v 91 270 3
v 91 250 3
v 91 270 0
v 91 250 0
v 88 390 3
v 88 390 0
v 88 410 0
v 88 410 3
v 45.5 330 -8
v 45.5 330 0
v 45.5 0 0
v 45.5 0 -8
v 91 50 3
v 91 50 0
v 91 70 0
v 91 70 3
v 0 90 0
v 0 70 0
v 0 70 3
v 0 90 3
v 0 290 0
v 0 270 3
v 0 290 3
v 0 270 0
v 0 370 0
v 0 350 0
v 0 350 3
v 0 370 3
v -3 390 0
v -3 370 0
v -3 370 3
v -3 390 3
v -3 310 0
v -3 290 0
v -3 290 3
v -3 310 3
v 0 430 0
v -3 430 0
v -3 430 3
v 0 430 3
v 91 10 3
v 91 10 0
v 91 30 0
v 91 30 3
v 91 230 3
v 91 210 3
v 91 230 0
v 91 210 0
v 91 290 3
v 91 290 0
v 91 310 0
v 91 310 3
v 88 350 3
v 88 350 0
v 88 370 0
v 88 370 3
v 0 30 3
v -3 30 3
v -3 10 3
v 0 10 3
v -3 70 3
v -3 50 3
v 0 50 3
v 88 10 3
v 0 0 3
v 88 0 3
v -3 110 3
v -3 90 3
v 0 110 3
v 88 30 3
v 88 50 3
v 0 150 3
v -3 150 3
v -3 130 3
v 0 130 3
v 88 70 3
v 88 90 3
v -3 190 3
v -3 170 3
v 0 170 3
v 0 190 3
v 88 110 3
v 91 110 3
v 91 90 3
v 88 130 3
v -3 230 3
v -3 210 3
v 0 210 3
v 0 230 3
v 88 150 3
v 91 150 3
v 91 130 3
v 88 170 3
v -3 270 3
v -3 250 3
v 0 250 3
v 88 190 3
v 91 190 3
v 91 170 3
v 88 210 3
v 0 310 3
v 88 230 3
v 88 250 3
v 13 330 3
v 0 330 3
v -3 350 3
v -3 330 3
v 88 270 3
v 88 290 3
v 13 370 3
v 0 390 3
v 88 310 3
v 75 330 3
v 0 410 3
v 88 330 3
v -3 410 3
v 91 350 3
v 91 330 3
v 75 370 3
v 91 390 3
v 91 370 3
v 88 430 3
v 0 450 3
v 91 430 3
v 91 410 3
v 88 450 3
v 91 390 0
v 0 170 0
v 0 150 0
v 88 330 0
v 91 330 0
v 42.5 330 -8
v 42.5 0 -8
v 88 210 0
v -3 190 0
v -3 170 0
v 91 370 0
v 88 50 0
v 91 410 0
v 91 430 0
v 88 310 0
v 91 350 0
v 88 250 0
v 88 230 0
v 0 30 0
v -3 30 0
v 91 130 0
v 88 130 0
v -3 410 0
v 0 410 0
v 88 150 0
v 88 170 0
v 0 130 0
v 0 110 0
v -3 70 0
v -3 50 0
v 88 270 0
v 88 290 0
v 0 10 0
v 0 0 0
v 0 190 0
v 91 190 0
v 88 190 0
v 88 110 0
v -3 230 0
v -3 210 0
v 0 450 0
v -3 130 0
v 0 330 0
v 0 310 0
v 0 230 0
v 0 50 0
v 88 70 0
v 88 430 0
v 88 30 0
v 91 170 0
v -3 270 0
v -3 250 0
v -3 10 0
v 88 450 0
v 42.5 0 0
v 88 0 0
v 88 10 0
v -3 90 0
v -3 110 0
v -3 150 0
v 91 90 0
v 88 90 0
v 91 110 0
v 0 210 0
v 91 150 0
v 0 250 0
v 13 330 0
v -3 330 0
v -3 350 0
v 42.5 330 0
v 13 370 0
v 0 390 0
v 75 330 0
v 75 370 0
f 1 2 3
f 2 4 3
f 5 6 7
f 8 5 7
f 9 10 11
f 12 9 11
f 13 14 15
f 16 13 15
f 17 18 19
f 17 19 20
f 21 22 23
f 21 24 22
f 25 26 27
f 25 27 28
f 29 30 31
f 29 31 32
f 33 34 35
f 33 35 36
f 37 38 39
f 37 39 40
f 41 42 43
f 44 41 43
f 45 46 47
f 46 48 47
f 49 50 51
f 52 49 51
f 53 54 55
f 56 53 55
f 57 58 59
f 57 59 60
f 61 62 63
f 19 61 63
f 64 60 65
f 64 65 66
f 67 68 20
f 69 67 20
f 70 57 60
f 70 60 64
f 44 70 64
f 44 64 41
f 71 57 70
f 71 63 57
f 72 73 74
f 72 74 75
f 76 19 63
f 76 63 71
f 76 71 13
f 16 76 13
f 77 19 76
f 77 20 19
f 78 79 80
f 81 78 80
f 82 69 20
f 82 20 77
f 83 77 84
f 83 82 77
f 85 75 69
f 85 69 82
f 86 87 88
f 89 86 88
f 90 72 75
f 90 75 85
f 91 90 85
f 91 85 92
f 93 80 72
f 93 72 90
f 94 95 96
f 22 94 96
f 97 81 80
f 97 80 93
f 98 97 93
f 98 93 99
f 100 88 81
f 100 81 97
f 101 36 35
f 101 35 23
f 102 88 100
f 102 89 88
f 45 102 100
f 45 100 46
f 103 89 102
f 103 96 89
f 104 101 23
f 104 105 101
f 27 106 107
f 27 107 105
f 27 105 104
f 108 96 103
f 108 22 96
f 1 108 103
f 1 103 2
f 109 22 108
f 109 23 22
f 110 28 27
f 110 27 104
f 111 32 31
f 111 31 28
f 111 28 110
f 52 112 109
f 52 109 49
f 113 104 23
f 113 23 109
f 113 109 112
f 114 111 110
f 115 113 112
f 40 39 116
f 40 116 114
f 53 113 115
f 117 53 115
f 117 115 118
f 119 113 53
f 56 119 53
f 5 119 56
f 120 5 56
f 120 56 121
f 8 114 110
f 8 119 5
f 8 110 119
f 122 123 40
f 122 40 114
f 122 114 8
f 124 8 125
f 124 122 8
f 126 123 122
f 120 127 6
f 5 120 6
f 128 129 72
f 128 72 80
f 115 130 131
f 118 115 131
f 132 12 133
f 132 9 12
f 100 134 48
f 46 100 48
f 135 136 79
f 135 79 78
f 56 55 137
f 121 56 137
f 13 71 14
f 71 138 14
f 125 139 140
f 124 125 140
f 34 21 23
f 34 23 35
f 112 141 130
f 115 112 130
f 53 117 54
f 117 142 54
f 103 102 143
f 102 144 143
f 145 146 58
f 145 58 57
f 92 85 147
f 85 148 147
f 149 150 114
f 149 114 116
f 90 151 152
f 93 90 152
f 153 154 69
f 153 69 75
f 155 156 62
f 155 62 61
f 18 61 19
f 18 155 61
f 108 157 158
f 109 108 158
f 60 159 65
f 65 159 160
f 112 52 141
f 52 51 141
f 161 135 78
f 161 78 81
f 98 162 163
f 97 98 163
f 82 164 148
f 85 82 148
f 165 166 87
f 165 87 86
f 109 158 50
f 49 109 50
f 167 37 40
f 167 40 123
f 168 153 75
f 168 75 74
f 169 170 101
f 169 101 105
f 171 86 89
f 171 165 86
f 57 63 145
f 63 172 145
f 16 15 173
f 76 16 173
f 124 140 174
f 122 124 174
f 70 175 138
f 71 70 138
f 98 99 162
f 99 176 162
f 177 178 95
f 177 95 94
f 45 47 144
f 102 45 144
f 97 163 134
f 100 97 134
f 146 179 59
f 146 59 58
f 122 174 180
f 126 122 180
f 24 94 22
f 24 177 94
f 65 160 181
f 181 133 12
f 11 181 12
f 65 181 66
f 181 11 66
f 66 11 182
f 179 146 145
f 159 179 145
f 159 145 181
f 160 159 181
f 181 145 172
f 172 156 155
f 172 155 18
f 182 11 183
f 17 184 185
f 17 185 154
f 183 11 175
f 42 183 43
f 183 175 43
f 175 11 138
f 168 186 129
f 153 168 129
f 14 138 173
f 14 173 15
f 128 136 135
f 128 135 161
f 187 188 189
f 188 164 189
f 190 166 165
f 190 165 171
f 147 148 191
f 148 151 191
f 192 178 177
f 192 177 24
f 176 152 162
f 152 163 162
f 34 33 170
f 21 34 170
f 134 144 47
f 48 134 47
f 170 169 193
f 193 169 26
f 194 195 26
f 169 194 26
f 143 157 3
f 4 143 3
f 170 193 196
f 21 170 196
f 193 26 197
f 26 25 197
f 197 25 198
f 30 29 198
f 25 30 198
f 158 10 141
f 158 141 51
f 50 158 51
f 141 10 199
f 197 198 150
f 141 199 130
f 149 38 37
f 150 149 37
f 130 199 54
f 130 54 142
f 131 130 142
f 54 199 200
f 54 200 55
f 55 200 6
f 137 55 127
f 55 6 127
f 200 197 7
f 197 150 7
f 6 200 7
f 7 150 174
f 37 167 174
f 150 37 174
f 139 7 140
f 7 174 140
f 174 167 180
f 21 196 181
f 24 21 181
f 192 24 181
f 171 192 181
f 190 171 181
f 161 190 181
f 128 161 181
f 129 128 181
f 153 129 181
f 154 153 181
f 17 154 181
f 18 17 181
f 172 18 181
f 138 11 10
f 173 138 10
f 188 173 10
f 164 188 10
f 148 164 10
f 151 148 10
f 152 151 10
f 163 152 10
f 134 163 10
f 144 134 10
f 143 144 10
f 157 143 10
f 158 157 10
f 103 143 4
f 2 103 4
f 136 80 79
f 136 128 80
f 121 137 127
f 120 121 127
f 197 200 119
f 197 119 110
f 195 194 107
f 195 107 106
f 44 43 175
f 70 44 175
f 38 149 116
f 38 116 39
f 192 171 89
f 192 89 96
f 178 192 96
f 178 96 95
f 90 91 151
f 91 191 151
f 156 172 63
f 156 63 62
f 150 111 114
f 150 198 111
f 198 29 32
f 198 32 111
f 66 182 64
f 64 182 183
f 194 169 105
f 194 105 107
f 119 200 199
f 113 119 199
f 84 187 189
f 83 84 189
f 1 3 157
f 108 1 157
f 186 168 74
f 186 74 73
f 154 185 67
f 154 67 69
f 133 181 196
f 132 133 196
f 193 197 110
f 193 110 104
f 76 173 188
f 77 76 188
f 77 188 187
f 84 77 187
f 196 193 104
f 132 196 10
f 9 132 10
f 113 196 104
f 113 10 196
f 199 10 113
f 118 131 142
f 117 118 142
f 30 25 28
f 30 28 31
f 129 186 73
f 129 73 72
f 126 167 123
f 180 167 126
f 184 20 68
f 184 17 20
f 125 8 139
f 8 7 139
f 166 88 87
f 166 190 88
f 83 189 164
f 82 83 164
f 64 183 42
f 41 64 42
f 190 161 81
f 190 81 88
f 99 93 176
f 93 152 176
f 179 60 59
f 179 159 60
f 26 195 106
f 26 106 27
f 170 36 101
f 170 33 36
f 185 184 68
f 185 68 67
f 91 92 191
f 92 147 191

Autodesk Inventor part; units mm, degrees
ref_plane "YZ Plane" through (0, 0, 0) normal (1, 0, 0) x (0, 1, 0)
ref_plane "XZ Plane" through (0, 0, 0) normal (0, 1, 0) x (-1, 0, 0)
ref_plane "XY Plane" through (0, 0, 0) normal (0, 0, 1) x (1, 0, 0)
sketch "Sketch1" plane through (0, 0, 0) normal (0, 0, 1) x (1, 0, 0)
  line L0 (0, 0) -> (88, 0)
  line L1 (88, 0) -> (88, 10)
  line L2 (88, 10) -> (91, 10)
  line L3 (91, 10) -> (91, 30)
  line L4 (91, 30) -> (88, 30)
  line L5 (88, 30) -> (88, 50)
  line L6 (88, 50) -> (91, 50)
  line L7 (91, 50) -> (91, 70)
  line L8 (91, 70) -> (88, 70)
  line L9 (88, 70) -> (88, 90)
  line L10 (88, 90) -> (91, 90)
  line L11 (91, 90) -> (91, 110)
  line L12 (91, 110) -> (88, 110)
  line L13 (88, 110) -> (88, 130)
  line L14 (88, 130) -> (91, 130)
  line L15 (91, 130) -> (91, 150)
  line L16 (91, 150) -> (88, 150)
  line L17 (88, 150) -> (88, 170)
  line L18 (88, 170) -> (91, 170)
  line L19 (91, 170) -> (91, 190)
  line L20 (91, 190) -> (88, 190)
  line L21 (88, 190) -> (88, 210)
  line L22 (88, 210) -> (91, 210)
  line L23 (91, 210) -> (91, 230)
  line L24 (91, 230) -> (88, 230)
  line L25 (88, 230) -> (88, 250)
  line L26 (88, 250) -> (91, 250)
  line L27 (91, 250) -> (91, 270)
  line L28 (91, 270) -> (88, 270)
  line L29 (88, 270) -> (88, 290)
  line L30 (88, 290) -> (91, 290)
  line L31 (91, 290) -> (91, 310)
  line L32 (91, 310) -> (88, 310)
  line L33 (88, 310) -> (88, 330)
  line L34 (88, 330) -> (91, 330)
  line L35 (91, 330) -> (91, 350)
  line L36 (91, 350) -> (88, 350)
  line L37 (88, 350) -> (88, 370)
  line L38 (88, 370) -> (91, 370)
  line L39 (91, 370) -> (91, 390)
  line L40 (91, 390) -> (88, 390)
  line L41 (88, 390) -> (88, 410)
  line L42 (88, 410) -> (91, 410)
  line L43 (91, 410) -> (91, 430)
  line L44 (91, 430) -> (88, 430)
  line L45 (44, 0) -> (44, 110) construction
  line L46 (-3, 10) -> (-3, 30)
  line L47 (-3, 30) -> (0, 30)
  line L48 (0, 10) -> (-3, 10)
  line L49 (0, 50) -> (-3, 50)
  line L50 (-3, 50) -> (-3, 70)
  line L51 (0, 70) -> (0, 90)
  line L52 (0, 90) -> (-3, 90)
  line L53 (-3, 90) -> (-3, 110)
  line L54 (-3, 70) -> (0, 70)
  line L55 (-3, 110) -> (0, 110)
  line L56 (0, 110) -> (0, 130)
  line L57 (0, 130) -> (-3, 130)
  line L58 (-3, 130) -> (-3, 150)
  line L59 (-3, 170) -> (-3, 190)
  line L60 (0, 150) -> (0, 170)
  line L61 (0, 170) -> (-3, 170)
  line L62 (-3, 150) -> (0, 150)
  line L63 (0, 190) -> (0, 210)
  line L64 (-3, 190) -> (0, 190)
  line L65 (0, 210) -> (-3, 210)
  line L66 (-3, 210) -> (-3, 230)
  line L67 (-3, 230) -> (0, 230)
  line L68 (0, 230) -> (0, 250)
  line L69 (0, 250) -> (-3, 250)
  line L70 (-3, 250) -> (-3, 270)
  line L71 (-3, 270) -> (0, 270)
  line L72 (0, 270) -> (0, 290)
  line L73 (0, 290) -> (-3, 290)
  line L74 (-3, 290) -> (-3, 310)
  line L75 (-3, 310) -> (0, 310)
  line L76 (0, 310) -> (0, 330)
  line L77 (0, 350) -> (0, 370)
  line L78 (-3, 350) -> (0, 350)
  line L79 (-3, 330) -> (-3, 350)
  line L80 (0, 330) -> (-3, 330)
  line L81 (0, 370) -> (-3, 370)
  line L82 (-3, 370) -> (-3, 390)
  line L83 (-3, 390) -> (0, 390)
  line L84 (0, 390) -> (0, 410)
  line L85 (0, 410) -> (-3, 410)
  line L86 (-3, 410) -> (-3, 430)
  line L87 (-3, 430) -> (0, 430)
  line L88 (0, 430) -> (0, 450)
  line L89 (0, 450) -> (88, 450)
  line L90 (88, 430) -> (88, 450)
  line L91 (0, 50) -> (0, 30)
  line L92 (0, 10) -> (0, 0)
  point P0 (0, 0)
  dimension "d1" = 10
  dimension "d2" = 3
  dimension "d3" = 20
  dimension "d4" = 3
  dimension "d5" = 20
  dimension "d6" = 20
  dimension "d7" = 20
  dimension "d8" = 20
  dimension "d9" = 20
  dimension "d10" = 3
  dimension "d11" = 20
  dimension "d12" = 20
  dimension "d13" = 20
  dimension "d14" = 3
  dimension "d15" = 20
  dimension "d16" = 3
  dimension "d17" = 20
  dimension "d18" = 20
  dimension "d19" = 20
  dimension "d20" = 3
  dimension "d21" = 20
  dimension "d22" = 20
  dimension "d23" = 20
  dimension "d24" = 20
  dimension "d25" = 20
  dimension "d26" = 20
  dimension "d27" = 20
  dimension "d28" = 20
  dimension "d30" = 0
  dimension "d31" = 0
  dimension "d34" = 110
  dimension "d35" = 0
  dimension "d36" = 0
  dimension "d37" = 0
  dimension "d38" = 0
  dimension "d39" = 3
  dimension "d43" = 88
  dimension "d65" = 20
extrude "Extrusion1" add sketch "Sketch1" along normal blind 3
sketch "Sketch4" plane through (0, 0, 0) normal (0, 0, -1) x (-1, 0, 0)
  line L0 (-98.5, 430) -> (-44, 430)
  line L1 (-91, 430) -> (3, 430) projected
  line L2 (-44.5, 330) -> (-75, 330)
  line L3 (-75, 350) -> (-75, 0) projected
  line L4 (-75, 330) -> (-75, 370)
  line L5 (-75, 370) -> (-43, 370)
  line L6 (-43, 370) -> (-13, 370)
  line L7 (-13, 370) -> (-13, 330)
  line L8 (-13, 330) -> (-44.5, 330)
  line L9 (0, 370) -> (0, 350) projected
  point P0 (0, 0)
  dimension "d55" = 30
  dimension "d58" = 60
  dimension "d59" = 40
  dimension "d61" = 30.5
  dimension "d62" = 0
  dimension "d63" = 80
  dimension "d64" = 23.5
  dimension "d66" = 13
extrude "Extrusion4" cut sketch "Sketch4" against normal blind 19
sketch "Sketch5" plane through (0, 0, 3) normal (0, 0, 1) x (1, 0, 0)
  point P0 (0, 0)
sketch "Sketch6" plane through (0, 0, 0) normal (0, 0, -1) x (-1, 0, 0)
  line L0 (0, 0) -> (-88, 0) projected
  line L1 (-44, 0) -> (-44, 330)
  line L2 (-75, 330) -> (-13, 330) projected
  line L3 (-44, 0) -> (-42.5, 0)
  line L4 (-42.5, 0) -> (-42.5, 330)
  line L5 (-44, 330) -> (-45.5, 330)
  line L6 (-45.5, 330) -> (-45.5, 0)
  line L7 (-44, 0) -> (-45.5, 0)
  dimension "d67" = 1.5
  dimension "d68" = 1.5
extrude "Extrusion5" add sketch "Sketch6" along normal blind 8
ref_plane "Work Plane1" through (44, 430, 0) normal (1, 0, 0) x (0, 0, -1)
properties part number "Part4 box" material "Wood (Birch)"
